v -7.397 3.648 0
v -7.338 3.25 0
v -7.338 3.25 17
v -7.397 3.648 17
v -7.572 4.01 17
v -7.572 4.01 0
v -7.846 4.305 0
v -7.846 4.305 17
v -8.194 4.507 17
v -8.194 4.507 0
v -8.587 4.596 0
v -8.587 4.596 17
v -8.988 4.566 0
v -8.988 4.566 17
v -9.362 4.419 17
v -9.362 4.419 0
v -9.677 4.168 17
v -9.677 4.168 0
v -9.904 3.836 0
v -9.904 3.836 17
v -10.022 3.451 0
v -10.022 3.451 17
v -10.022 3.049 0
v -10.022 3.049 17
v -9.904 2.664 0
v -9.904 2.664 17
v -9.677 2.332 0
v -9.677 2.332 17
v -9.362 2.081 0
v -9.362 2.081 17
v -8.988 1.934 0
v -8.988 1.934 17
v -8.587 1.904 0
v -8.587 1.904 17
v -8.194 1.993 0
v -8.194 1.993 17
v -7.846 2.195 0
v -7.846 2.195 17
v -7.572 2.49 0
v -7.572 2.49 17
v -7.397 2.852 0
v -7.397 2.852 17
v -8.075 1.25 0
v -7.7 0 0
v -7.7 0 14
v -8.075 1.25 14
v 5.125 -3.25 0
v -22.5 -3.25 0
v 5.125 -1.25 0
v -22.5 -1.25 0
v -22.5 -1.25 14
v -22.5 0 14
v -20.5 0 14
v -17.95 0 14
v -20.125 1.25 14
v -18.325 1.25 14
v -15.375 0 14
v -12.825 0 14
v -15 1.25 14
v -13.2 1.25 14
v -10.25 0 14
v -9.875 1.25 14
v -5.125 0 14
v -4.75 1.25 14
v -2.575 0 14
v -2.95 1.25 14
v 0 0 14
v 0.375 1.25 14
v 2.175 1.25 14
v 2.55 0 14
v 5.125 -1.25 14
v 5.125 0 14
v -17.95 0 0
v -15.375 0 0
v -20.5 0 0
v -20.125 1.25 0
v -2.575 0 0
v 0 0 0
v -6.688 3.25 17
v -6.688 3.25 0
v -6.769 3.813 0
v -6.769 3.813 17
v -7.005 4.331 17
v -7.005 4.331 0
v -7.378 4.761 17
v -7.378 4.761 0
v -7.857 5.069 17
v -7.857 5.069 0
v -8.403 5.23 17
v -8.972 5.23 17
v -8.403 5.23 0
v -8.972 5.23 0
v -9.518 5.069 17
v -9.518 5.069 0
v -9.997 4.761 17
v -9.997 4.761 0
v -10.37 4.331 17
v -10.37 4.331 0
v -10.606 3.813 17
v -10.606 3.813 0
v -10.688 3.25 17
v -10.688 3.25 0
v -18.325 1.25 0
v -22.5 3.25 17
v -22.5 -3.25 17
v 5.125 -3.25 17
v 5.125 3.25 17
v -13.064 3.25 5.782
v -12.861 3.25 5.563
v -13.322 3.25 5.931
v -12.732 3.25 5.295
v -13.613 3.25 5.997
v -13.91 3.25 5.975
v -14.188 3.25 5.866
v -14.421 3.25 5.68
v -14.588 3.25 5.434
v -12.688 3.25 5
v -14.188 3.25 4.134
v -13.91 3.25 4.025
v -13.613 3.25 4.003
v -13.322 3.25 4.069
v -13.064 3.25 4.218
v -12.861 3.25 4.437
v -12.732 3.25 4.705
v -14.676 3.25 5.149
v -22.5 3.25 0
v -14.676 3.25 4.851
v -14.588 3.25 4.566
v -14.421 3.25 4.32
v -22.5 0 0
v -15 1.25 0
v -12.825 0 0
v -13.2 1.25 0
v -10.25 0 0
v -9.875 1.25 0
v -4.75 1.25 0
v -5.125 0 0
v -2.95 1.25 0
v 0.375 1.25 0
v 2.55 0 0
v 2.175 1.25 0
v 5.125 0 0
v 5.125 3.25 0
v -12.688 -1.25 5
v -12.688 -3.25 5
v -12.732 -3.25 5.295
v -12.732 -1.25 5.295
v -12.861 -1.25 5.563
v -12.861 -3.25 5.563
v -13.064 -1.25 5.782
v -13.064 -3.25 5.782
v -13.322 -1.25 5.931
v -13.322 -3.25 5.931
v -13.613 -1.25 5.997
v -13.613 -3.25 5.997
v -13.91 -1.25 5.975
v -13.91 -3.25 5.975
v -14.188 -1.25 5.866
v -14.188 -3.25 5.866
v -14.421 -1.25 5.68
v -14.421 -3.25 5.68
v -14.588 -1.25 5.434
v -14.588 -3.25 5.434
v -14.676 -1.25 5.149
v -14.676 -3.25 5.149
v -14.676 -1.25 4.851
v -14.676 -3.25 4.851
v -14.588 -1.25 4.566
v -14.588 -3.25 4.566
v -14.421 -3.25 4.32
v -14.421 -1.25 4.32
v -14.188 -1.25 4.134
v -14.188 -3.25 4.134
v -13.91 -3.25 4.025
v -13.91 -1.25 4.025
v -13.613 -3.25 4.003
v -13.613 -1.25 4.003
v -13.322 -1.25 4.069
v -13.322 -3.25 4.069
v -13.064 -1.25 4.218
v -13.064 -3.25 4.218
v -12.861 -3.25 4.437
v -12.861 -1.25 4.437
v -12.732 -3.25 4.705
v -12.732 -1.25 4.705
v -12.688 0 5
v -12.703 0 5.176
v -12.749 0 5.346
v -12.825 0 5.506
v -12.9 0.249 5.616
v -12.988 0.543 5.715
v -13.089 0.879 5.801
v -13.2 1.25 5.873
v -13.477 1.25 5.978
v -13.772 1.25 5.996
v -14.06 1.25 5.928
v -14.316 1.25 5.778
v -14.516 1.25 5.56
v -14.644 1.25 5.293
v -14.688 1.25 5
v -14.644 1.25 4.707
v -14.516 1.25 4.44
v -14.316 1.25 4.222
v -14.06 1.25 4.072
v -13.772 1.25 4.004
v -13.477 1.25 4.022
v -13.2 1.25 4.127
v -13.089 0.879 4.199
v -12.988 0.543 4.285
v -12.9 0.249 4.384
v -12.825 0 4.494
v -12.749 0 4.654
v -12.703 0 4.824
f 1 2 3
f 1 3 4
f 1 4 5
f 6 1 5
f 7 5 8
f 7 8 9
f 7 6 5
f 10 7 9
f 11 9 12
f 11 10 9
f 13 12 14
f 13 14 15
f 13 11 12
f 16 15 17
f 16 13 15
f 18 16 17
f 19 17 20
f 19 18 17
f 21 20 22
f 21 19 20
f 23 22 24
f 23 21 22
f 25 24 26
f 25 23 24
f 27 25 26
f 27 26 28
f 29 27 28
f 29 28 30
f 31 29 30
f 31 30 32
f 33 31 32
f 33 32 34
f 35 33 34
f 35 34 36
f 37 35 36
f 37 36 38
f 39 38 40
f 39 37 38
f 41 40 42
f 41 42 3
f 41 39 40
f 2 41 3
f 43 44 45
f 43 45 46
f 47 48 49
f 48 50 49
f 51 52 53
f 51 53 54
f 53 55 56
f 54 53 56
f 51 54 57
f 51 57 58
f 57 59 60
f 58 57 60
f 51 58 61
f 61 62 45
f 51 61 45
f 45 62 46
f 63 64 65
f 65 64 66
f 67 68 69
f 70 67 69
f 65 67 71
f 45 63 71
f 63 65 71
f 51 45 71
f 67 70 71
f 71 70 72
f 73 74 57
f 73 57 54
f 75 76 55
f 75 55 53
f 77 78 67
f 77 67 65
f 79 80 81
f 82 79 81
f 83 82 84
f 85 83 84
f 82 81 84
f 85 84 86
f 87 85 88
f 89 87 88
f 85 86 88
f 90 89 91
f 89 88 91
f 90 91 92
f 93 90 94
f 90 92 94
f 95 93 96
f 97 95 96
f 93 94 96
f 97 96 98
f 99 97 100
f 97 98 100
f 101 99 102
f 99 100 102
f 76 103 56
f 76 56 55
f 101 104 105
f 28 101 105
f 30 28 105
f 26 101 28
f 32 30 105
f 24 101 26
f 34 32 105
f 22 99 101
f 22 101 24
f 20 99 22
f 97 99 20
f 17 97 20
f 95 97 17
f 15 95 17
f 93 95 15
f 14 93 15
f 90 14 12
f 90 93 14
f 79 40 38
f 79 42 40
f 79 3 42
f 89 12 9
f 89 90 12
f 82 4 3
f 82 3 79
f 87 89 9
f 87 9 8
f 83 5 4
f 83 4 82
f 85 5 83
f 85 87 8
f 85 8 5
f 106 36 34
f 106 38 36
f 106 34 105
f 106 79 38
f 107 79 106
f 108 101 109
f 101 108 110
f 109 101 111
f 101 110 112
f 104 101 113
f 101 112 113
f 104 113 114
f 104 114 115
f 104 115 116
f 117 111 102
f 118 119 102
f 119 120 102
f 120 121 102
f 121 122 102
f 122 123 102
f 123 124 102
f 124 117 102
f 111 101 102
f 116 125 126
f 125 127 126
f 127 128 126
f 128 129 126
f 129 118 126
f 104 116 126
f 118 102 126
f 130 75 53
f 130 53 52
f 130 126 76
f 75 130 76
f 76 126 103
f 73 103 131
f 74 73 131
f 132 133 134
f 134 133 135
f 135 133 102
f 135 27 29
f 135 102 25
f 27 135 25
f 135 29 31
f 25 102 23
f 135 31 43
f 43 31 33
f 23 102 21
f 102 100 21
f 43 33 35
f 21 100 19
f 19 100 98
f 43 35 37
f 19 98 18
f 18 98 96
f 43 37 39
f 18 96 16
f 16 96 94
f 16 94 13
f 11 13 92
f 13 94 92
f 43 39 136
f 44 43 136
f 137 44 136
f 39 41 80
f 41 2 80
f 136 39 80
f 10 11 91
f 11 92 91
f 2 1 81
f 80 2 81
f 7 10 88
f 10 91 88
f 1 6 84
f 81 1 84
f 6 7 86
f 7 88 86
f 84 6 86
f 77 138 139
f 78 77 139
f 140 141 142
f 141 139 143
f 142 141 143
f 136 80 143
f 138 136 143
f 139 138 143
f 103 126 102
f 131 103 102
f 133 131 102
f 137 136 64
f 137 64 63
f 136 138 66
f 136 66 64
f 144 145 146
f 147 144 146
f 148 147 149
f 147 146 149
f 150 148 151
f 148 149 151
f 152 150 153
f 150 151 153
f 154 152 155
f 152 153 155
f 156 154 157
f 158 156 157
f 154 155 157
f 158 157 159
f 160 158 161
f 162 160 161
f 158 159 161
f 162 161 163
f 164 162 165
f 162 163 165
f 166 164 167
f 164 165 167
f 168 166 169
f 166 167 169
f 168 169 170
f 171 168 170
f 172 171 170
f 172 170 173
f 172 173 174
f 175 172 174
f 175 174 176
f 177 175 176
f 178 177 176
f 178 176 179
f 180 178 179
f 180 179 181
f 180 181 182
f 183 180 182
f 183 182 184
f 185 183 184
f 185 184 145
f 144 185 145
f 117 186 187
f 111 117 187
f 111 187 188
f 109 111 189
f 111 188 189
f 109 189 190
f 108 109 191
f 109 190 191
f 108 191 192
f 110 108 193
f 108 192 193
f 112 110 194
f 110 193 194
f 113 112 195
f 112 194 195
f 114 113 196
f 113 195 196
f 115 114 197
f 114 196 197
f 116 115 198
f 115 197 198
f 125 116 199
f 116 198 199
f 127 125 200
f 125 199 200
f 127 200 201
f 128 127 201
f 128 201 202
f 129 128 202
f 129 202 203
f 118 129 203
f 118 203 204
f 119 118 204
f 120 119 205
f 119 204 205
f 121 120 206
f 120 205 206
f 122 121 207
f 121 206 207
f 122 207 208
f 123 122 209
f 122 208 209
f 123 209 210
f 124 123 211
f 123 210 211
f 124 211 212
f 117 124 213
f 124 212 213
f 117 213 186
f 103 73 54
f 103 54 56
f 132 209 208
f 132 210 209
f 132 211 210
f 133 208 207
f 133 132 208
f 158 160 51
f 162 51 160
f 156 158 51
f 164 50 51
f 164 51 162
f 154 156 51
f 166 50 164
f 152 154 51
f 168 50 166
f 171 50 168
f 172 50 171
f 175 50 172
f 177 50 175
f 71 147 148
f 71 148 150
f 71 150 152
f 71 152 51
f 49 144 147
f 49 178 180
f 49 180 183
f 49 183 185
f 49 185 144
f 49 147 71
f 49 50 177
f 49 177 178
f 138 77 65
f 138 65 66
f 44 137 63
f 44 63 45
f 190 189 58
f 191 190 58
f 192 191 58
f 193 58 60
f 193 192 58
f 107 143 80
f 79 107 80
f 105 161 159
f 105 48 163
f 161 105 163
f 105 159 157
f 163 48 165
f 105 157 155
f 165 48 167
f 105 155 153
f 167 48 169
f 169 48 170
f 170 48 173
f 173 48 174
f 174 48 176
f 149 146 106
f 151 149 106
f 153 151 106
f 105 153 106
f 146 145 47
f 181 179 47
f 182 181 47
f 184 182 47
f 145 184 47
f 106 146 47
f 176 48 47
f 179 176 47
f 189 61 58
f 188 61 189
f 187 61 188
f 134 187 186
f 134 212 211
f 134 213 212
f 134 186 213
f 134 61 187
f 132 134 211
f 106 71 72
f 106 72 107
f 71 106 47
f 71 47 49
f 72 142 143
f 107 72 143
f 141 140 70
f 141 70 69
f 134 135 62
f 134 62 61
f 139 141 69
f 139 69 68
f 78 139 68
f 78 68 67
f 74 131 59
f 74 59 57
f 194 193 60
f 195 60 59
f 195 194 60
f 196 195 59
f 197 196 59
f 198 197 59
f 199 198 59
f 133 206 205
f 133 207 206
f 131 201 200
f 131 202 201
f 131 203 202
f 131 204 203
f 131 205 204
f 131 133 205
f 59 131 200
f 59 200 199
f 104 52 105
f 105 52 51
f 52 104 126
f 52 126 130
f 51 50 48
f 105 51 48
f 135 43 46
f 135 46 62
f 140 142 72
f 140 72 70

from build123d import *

# Parameters (mm, degrees)
F1_DEPTH = 14
F2_R     = 1.35
F3_DEPTH = 17
F5_R     = 1
F6_DEPTH = 25


with BuildPart() as f1:
    # F0 (on Top) → F1 (new body)
    with BuildSketch(Plane.XY):
        Polygon((-20.125, 1.25), (-20.5, 0), (-22.5, 0), (-22.5, -1.25), (-20.5, -1.25), (5.125, -1.25), (5.125, 0), (2.55, 0), (2.175, 1.25), (0.375, 1.25), (0, 0), (-2.575, 0), (-2.95, 1.25), (-4.75, 1.25), (-5.125, 0), (-7.7, 0), (-8.075, 1.25), (-9.875, 1.25), (-10.25, 0), (-12.825, 0), (-13.2, 1.25), (-15, 1.25), (-15.375, 0), (-17.95, 0), (-18.325, 1.25), align=None)
    extrude(amount=F1_DEPTH)


with BuildPart() as f3:
    # F2 (on Top) → F3 (new body)
    with BuildSketch(Plane.XY):
        with BuildLine():
            Line((5.125, -3.25), (5.125, 3.25))
            Line((5.125, 3.25), (-6.6875, 3.25))
            ThreePointArc((-6.6875, 3.25), (-8.6875, 5.25), (-10.6875, 3.25))
            Line((-10.6875, 3.25), (-22.5, 3.25))
            Line((-22.5, 3.25), (-22.5, -3.25))
            Line((-22.5, -3.25), (5.125, -3.25))
        make_face()
        with Locations((-8.6875, 3.25)):
            Circle(F2_R, mode=Mode.SUBTRACT)
    extrude(amount=F3_DEPTH)

    # F4: cut F1
    add(f1.part, mode=Mode.SUBTRACT)

    # F5 (on face) → F6 (cut)
    with BuildSketch(Plane.XZ.offset(3.25)):
        with Locations((-13.6875, 5)):
            Circle(F5_R)
    extrude(amount=-F6_DEPTH, mode=Mode.SUBTRACT)


solid = f3.part
